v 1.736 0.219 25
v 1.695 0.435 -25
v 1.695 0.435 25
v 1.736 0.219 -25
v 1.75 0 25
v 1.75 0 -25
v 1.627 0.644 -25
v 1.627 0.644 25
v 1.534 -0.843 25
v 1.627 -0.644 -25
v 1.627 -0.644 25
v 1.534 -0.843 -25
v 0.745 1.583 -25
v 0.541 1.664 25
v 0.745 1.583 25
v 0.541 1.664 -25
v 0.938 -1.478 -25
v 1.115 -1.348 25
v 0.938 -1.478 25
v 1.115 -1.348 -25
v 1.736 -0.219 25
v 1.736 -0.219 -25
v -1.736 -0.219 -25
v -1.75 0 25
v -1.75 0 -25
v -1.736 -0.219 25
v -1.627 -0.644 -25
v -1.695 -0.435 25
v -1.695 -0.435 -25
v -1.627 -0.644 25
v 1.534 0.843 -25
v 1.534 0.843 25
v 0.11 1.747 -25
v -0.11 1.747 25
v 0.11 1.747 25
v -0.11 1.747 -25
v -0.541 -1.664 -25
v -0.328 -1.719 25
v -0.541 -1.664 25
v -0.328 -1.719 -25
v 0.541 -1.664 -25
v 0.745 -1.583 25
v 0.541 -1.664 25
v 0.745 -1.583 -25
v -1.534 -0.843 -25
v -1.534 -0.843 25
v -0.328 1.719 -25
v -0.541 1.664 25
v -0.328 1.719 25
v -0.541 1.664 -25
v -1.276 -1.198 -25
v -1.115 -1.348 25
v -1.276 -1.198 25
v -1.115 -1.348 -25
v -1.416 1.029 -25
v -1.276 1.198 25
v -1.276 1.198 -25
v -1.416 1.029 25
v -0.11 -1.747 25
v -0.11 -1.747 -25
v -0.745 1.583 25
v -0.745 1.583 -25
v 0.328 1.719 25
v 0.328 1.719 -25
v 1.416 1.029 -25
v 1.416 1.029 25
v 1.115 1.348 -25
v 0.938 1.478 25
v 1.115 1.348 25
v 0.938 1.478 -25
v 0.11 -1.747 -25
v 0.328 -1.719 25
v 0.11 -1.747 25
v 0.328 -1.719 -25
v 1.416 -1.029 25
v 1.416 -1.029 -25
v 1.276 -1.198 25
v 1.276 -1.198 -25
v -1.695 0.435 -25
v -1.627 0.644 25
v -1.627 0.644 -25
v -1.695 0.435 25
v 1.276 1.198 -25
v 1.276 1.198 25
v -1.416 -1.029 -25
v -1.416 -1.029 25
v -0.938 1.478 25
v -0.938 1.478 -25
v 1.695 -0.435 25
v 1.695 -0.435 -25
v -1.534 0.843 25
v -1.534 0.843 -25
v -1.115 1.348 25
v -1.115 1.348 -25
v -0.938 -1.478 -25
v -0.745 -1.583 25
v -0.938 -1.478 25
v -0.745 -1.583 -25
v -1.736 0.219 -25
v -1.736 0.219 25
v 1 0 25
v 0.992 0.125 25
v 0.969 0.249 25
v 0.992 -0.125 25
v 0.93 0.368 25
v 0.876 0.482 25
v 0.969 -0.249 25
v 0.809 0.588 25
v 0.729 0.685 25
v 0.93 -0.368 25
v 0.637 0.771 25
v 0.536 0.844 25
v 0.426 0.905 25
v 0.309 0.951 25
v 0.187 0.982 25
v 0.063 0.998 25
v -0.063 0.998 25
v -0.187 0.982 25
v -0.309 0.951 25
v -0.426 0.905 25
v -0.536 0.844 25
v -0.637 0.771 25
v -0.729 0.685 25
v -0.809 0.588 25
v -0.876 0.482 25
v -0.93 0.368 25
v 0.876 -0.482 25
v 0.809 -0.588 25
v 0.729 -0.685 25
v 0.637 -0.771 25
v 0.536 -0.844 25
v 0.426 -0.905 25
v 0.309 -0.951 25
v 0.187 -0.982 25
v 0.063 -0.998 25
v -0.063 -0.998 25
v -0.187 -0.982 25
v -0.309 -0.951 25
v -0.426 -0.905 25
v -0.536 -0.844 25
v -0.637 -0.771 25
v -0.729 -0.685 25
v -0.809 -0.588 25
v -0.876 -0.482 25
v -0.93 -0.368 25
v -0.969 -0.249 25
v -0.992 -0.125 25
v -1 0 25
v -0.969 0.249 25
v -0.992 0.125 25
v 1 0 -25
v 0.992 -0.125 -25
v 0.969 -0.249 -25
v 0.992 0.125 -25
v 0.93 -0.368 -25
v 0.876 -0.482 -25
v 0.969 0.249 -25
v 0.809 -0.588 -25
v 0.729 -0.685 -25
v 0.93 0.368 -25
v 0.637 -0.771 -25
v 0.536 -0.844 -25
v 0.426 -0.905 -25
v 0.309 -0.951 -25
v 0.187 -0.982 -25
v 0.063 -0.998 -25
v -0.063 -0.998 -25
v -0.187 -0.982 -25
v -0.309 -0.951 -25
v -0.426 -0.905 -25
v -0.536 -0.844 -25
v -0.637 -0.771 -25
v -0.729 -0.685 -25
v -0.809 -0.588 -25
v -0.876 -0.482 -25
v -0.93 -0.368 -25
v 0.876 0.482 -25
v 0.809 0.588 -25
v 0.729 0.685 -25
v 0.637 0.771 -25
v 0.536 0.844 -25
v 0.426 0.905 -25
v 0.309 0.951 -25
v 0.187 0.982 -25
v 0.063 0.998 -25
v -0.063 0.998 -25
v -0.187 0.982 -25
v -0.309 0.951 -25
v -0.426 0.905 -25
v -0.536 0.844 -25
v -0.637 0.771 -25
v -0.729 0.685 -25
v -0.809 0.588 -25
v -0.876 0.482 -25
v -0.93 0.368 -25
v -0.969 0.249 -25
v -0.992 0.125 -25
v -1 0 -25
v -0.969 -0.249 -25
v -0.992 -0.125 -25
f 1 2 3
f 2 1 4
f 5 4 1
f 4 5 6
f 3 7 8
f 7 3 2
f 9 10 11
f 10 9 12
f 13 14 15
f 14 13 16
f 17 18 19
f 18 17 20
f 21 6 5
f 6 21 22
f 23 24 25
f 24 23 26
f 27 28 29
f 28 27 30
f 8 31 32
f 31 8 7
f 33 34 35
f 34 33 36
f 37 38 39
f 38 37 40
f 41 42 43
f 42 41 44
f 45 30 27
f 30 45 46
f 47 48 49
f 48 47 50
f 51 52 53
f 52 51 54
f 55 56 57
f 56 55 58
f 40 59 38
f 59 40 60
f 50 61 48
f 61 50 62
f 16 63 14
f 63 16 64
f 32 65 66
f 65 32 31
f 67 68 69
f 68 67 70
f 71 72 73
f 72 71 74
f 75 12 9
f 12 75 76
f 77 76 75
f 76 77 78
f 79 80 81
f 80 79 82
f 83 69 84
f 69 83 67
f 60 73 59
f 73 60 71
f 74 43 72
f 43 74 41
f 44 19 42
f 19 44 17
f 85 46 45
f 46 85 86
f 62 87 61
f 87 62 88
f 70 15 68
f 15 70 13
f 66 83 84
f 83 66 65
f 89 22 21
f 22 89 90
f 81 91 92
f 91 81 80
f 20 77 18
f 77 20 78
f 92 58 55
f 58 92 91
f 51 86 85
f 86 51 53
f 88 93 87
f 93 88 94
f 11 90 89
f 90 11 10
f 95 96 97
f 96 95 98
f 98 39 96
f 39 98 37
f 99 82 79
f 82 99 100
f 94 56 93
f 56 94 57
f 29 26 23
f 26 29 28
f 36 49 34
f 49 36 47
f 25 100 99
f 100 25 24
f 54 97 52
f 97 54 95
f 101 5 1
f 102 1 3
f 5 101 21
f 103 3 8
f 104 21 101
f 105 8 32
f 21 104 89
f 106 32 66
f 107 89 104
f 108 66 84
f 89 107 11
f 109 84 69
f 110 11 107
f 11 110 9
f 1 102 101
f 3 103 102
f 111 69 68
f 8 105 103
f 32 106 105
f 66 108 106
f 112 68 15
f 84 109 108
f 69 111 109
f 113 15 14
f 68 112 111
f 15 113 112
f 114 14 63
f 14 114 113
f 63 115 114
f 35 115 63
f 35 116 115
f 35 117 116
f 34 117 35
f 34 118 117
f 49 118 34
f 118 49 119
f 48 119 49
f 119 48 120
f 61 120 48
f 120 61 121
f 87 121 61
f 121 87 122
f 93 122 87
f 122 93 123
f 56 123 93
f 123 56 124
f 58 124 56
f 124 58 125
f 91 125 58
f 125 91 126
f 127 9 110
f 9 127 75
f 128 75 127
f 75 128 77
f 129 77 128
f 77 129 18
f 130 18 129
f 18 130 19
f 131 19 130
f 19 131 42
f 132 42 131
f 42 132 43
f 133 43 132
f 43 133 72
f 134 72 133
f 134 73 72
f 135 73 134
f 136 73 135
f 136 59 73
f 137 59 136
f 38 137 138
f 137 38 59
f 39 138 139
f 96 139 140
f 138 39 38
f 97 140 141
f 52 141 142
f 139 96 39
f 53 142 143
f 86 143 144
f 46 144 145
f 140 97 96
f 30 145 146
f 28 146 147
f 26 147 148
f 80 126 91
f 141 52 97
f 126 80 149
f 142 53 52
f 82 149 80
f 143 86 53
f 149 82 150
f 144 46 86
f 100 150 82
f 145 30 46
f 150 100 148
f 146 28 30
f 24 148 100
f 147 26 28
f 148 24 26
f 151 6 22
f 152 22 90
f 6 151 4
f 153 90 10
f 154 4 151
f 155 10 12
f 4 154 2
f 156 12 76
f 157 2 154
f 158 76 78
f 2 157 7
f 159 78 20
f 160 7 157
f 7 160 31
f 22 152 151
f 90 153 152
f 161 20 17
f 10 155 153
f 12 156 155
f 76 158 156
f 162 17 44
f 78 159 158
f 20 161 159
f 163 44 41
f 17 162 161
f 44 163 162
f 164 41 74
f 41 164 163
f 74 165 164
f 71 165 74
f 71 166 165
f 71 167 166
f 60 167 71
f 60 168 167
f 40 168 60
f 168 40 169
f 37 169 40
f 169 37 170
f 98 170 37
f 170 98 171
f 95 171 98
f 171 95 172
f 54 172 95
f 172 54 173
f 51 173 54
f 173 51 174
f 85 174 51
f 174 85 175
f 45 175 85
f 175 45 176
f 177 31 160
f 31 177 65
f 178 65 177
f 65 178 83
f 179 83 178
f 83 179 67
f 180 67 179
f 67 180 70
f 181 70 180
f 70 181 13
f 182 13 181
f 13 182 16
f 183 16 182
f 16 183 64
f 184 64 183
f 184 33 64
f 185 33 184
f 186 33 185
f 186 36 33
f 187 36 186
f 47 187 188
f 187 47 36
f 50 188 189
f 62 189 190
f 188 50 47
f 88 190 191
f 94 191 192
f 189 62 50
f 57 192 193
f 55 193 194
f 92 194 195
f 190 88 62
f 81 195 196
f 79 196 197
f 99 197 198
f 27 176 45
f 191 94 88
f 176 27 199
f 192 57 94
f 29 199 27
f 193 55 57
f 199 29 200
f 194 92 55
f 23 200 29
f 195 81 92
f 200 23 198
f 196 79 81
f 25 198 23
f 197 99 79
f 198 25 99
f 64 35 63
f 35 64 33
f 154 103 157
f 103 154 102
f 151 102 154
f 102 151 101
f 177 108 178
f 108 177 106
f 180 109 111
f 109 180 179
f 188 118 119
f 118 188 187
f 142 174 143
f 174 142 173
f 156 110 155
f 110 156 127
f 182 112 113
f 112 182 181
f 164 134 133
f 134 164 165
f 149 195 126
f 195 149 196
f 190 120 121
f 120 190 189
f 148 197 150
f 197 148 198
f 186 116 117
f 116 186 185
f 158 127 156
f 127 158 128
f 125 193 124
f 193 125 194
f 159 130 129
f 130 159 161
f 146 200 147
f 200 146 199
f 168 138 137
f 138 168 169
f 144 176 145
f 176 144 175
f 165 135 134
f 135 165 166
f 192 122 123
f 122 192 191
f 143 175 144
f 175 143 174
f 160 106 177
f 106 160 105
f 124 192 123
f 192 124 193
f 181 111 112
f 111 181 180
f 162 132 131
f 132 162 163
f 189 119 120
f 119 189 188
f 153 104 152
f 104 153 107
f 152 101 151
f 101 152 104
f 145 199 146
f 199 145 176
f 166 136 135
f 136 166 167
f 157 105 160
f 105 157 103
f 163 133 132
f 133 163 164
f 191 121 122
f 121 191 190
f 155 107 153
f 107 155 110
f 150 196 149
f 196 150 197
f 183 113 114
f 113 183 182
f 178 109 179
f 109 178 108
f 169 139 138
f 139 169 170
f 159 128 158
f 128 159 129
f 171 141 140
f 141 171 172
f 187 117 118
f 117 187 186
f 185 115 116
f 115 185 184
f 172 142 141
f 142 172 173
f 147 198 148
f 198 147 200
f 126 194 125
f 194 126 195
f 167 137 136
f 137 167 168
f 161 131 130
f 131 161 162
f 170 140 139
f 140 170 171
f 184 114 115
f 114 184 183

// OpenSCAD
$fn = 50;


difference() {
	union() {
		translate(v = [0, 0, -25.0000000000]) {
			cylinder(h = 50, r = 1.7500000000);
		}
	}
	union() {
		translate(v = [0, 0, -100.0000000000]) {
			cylinder(h = 200, r = 1.0000000000);
		}
	}
}
